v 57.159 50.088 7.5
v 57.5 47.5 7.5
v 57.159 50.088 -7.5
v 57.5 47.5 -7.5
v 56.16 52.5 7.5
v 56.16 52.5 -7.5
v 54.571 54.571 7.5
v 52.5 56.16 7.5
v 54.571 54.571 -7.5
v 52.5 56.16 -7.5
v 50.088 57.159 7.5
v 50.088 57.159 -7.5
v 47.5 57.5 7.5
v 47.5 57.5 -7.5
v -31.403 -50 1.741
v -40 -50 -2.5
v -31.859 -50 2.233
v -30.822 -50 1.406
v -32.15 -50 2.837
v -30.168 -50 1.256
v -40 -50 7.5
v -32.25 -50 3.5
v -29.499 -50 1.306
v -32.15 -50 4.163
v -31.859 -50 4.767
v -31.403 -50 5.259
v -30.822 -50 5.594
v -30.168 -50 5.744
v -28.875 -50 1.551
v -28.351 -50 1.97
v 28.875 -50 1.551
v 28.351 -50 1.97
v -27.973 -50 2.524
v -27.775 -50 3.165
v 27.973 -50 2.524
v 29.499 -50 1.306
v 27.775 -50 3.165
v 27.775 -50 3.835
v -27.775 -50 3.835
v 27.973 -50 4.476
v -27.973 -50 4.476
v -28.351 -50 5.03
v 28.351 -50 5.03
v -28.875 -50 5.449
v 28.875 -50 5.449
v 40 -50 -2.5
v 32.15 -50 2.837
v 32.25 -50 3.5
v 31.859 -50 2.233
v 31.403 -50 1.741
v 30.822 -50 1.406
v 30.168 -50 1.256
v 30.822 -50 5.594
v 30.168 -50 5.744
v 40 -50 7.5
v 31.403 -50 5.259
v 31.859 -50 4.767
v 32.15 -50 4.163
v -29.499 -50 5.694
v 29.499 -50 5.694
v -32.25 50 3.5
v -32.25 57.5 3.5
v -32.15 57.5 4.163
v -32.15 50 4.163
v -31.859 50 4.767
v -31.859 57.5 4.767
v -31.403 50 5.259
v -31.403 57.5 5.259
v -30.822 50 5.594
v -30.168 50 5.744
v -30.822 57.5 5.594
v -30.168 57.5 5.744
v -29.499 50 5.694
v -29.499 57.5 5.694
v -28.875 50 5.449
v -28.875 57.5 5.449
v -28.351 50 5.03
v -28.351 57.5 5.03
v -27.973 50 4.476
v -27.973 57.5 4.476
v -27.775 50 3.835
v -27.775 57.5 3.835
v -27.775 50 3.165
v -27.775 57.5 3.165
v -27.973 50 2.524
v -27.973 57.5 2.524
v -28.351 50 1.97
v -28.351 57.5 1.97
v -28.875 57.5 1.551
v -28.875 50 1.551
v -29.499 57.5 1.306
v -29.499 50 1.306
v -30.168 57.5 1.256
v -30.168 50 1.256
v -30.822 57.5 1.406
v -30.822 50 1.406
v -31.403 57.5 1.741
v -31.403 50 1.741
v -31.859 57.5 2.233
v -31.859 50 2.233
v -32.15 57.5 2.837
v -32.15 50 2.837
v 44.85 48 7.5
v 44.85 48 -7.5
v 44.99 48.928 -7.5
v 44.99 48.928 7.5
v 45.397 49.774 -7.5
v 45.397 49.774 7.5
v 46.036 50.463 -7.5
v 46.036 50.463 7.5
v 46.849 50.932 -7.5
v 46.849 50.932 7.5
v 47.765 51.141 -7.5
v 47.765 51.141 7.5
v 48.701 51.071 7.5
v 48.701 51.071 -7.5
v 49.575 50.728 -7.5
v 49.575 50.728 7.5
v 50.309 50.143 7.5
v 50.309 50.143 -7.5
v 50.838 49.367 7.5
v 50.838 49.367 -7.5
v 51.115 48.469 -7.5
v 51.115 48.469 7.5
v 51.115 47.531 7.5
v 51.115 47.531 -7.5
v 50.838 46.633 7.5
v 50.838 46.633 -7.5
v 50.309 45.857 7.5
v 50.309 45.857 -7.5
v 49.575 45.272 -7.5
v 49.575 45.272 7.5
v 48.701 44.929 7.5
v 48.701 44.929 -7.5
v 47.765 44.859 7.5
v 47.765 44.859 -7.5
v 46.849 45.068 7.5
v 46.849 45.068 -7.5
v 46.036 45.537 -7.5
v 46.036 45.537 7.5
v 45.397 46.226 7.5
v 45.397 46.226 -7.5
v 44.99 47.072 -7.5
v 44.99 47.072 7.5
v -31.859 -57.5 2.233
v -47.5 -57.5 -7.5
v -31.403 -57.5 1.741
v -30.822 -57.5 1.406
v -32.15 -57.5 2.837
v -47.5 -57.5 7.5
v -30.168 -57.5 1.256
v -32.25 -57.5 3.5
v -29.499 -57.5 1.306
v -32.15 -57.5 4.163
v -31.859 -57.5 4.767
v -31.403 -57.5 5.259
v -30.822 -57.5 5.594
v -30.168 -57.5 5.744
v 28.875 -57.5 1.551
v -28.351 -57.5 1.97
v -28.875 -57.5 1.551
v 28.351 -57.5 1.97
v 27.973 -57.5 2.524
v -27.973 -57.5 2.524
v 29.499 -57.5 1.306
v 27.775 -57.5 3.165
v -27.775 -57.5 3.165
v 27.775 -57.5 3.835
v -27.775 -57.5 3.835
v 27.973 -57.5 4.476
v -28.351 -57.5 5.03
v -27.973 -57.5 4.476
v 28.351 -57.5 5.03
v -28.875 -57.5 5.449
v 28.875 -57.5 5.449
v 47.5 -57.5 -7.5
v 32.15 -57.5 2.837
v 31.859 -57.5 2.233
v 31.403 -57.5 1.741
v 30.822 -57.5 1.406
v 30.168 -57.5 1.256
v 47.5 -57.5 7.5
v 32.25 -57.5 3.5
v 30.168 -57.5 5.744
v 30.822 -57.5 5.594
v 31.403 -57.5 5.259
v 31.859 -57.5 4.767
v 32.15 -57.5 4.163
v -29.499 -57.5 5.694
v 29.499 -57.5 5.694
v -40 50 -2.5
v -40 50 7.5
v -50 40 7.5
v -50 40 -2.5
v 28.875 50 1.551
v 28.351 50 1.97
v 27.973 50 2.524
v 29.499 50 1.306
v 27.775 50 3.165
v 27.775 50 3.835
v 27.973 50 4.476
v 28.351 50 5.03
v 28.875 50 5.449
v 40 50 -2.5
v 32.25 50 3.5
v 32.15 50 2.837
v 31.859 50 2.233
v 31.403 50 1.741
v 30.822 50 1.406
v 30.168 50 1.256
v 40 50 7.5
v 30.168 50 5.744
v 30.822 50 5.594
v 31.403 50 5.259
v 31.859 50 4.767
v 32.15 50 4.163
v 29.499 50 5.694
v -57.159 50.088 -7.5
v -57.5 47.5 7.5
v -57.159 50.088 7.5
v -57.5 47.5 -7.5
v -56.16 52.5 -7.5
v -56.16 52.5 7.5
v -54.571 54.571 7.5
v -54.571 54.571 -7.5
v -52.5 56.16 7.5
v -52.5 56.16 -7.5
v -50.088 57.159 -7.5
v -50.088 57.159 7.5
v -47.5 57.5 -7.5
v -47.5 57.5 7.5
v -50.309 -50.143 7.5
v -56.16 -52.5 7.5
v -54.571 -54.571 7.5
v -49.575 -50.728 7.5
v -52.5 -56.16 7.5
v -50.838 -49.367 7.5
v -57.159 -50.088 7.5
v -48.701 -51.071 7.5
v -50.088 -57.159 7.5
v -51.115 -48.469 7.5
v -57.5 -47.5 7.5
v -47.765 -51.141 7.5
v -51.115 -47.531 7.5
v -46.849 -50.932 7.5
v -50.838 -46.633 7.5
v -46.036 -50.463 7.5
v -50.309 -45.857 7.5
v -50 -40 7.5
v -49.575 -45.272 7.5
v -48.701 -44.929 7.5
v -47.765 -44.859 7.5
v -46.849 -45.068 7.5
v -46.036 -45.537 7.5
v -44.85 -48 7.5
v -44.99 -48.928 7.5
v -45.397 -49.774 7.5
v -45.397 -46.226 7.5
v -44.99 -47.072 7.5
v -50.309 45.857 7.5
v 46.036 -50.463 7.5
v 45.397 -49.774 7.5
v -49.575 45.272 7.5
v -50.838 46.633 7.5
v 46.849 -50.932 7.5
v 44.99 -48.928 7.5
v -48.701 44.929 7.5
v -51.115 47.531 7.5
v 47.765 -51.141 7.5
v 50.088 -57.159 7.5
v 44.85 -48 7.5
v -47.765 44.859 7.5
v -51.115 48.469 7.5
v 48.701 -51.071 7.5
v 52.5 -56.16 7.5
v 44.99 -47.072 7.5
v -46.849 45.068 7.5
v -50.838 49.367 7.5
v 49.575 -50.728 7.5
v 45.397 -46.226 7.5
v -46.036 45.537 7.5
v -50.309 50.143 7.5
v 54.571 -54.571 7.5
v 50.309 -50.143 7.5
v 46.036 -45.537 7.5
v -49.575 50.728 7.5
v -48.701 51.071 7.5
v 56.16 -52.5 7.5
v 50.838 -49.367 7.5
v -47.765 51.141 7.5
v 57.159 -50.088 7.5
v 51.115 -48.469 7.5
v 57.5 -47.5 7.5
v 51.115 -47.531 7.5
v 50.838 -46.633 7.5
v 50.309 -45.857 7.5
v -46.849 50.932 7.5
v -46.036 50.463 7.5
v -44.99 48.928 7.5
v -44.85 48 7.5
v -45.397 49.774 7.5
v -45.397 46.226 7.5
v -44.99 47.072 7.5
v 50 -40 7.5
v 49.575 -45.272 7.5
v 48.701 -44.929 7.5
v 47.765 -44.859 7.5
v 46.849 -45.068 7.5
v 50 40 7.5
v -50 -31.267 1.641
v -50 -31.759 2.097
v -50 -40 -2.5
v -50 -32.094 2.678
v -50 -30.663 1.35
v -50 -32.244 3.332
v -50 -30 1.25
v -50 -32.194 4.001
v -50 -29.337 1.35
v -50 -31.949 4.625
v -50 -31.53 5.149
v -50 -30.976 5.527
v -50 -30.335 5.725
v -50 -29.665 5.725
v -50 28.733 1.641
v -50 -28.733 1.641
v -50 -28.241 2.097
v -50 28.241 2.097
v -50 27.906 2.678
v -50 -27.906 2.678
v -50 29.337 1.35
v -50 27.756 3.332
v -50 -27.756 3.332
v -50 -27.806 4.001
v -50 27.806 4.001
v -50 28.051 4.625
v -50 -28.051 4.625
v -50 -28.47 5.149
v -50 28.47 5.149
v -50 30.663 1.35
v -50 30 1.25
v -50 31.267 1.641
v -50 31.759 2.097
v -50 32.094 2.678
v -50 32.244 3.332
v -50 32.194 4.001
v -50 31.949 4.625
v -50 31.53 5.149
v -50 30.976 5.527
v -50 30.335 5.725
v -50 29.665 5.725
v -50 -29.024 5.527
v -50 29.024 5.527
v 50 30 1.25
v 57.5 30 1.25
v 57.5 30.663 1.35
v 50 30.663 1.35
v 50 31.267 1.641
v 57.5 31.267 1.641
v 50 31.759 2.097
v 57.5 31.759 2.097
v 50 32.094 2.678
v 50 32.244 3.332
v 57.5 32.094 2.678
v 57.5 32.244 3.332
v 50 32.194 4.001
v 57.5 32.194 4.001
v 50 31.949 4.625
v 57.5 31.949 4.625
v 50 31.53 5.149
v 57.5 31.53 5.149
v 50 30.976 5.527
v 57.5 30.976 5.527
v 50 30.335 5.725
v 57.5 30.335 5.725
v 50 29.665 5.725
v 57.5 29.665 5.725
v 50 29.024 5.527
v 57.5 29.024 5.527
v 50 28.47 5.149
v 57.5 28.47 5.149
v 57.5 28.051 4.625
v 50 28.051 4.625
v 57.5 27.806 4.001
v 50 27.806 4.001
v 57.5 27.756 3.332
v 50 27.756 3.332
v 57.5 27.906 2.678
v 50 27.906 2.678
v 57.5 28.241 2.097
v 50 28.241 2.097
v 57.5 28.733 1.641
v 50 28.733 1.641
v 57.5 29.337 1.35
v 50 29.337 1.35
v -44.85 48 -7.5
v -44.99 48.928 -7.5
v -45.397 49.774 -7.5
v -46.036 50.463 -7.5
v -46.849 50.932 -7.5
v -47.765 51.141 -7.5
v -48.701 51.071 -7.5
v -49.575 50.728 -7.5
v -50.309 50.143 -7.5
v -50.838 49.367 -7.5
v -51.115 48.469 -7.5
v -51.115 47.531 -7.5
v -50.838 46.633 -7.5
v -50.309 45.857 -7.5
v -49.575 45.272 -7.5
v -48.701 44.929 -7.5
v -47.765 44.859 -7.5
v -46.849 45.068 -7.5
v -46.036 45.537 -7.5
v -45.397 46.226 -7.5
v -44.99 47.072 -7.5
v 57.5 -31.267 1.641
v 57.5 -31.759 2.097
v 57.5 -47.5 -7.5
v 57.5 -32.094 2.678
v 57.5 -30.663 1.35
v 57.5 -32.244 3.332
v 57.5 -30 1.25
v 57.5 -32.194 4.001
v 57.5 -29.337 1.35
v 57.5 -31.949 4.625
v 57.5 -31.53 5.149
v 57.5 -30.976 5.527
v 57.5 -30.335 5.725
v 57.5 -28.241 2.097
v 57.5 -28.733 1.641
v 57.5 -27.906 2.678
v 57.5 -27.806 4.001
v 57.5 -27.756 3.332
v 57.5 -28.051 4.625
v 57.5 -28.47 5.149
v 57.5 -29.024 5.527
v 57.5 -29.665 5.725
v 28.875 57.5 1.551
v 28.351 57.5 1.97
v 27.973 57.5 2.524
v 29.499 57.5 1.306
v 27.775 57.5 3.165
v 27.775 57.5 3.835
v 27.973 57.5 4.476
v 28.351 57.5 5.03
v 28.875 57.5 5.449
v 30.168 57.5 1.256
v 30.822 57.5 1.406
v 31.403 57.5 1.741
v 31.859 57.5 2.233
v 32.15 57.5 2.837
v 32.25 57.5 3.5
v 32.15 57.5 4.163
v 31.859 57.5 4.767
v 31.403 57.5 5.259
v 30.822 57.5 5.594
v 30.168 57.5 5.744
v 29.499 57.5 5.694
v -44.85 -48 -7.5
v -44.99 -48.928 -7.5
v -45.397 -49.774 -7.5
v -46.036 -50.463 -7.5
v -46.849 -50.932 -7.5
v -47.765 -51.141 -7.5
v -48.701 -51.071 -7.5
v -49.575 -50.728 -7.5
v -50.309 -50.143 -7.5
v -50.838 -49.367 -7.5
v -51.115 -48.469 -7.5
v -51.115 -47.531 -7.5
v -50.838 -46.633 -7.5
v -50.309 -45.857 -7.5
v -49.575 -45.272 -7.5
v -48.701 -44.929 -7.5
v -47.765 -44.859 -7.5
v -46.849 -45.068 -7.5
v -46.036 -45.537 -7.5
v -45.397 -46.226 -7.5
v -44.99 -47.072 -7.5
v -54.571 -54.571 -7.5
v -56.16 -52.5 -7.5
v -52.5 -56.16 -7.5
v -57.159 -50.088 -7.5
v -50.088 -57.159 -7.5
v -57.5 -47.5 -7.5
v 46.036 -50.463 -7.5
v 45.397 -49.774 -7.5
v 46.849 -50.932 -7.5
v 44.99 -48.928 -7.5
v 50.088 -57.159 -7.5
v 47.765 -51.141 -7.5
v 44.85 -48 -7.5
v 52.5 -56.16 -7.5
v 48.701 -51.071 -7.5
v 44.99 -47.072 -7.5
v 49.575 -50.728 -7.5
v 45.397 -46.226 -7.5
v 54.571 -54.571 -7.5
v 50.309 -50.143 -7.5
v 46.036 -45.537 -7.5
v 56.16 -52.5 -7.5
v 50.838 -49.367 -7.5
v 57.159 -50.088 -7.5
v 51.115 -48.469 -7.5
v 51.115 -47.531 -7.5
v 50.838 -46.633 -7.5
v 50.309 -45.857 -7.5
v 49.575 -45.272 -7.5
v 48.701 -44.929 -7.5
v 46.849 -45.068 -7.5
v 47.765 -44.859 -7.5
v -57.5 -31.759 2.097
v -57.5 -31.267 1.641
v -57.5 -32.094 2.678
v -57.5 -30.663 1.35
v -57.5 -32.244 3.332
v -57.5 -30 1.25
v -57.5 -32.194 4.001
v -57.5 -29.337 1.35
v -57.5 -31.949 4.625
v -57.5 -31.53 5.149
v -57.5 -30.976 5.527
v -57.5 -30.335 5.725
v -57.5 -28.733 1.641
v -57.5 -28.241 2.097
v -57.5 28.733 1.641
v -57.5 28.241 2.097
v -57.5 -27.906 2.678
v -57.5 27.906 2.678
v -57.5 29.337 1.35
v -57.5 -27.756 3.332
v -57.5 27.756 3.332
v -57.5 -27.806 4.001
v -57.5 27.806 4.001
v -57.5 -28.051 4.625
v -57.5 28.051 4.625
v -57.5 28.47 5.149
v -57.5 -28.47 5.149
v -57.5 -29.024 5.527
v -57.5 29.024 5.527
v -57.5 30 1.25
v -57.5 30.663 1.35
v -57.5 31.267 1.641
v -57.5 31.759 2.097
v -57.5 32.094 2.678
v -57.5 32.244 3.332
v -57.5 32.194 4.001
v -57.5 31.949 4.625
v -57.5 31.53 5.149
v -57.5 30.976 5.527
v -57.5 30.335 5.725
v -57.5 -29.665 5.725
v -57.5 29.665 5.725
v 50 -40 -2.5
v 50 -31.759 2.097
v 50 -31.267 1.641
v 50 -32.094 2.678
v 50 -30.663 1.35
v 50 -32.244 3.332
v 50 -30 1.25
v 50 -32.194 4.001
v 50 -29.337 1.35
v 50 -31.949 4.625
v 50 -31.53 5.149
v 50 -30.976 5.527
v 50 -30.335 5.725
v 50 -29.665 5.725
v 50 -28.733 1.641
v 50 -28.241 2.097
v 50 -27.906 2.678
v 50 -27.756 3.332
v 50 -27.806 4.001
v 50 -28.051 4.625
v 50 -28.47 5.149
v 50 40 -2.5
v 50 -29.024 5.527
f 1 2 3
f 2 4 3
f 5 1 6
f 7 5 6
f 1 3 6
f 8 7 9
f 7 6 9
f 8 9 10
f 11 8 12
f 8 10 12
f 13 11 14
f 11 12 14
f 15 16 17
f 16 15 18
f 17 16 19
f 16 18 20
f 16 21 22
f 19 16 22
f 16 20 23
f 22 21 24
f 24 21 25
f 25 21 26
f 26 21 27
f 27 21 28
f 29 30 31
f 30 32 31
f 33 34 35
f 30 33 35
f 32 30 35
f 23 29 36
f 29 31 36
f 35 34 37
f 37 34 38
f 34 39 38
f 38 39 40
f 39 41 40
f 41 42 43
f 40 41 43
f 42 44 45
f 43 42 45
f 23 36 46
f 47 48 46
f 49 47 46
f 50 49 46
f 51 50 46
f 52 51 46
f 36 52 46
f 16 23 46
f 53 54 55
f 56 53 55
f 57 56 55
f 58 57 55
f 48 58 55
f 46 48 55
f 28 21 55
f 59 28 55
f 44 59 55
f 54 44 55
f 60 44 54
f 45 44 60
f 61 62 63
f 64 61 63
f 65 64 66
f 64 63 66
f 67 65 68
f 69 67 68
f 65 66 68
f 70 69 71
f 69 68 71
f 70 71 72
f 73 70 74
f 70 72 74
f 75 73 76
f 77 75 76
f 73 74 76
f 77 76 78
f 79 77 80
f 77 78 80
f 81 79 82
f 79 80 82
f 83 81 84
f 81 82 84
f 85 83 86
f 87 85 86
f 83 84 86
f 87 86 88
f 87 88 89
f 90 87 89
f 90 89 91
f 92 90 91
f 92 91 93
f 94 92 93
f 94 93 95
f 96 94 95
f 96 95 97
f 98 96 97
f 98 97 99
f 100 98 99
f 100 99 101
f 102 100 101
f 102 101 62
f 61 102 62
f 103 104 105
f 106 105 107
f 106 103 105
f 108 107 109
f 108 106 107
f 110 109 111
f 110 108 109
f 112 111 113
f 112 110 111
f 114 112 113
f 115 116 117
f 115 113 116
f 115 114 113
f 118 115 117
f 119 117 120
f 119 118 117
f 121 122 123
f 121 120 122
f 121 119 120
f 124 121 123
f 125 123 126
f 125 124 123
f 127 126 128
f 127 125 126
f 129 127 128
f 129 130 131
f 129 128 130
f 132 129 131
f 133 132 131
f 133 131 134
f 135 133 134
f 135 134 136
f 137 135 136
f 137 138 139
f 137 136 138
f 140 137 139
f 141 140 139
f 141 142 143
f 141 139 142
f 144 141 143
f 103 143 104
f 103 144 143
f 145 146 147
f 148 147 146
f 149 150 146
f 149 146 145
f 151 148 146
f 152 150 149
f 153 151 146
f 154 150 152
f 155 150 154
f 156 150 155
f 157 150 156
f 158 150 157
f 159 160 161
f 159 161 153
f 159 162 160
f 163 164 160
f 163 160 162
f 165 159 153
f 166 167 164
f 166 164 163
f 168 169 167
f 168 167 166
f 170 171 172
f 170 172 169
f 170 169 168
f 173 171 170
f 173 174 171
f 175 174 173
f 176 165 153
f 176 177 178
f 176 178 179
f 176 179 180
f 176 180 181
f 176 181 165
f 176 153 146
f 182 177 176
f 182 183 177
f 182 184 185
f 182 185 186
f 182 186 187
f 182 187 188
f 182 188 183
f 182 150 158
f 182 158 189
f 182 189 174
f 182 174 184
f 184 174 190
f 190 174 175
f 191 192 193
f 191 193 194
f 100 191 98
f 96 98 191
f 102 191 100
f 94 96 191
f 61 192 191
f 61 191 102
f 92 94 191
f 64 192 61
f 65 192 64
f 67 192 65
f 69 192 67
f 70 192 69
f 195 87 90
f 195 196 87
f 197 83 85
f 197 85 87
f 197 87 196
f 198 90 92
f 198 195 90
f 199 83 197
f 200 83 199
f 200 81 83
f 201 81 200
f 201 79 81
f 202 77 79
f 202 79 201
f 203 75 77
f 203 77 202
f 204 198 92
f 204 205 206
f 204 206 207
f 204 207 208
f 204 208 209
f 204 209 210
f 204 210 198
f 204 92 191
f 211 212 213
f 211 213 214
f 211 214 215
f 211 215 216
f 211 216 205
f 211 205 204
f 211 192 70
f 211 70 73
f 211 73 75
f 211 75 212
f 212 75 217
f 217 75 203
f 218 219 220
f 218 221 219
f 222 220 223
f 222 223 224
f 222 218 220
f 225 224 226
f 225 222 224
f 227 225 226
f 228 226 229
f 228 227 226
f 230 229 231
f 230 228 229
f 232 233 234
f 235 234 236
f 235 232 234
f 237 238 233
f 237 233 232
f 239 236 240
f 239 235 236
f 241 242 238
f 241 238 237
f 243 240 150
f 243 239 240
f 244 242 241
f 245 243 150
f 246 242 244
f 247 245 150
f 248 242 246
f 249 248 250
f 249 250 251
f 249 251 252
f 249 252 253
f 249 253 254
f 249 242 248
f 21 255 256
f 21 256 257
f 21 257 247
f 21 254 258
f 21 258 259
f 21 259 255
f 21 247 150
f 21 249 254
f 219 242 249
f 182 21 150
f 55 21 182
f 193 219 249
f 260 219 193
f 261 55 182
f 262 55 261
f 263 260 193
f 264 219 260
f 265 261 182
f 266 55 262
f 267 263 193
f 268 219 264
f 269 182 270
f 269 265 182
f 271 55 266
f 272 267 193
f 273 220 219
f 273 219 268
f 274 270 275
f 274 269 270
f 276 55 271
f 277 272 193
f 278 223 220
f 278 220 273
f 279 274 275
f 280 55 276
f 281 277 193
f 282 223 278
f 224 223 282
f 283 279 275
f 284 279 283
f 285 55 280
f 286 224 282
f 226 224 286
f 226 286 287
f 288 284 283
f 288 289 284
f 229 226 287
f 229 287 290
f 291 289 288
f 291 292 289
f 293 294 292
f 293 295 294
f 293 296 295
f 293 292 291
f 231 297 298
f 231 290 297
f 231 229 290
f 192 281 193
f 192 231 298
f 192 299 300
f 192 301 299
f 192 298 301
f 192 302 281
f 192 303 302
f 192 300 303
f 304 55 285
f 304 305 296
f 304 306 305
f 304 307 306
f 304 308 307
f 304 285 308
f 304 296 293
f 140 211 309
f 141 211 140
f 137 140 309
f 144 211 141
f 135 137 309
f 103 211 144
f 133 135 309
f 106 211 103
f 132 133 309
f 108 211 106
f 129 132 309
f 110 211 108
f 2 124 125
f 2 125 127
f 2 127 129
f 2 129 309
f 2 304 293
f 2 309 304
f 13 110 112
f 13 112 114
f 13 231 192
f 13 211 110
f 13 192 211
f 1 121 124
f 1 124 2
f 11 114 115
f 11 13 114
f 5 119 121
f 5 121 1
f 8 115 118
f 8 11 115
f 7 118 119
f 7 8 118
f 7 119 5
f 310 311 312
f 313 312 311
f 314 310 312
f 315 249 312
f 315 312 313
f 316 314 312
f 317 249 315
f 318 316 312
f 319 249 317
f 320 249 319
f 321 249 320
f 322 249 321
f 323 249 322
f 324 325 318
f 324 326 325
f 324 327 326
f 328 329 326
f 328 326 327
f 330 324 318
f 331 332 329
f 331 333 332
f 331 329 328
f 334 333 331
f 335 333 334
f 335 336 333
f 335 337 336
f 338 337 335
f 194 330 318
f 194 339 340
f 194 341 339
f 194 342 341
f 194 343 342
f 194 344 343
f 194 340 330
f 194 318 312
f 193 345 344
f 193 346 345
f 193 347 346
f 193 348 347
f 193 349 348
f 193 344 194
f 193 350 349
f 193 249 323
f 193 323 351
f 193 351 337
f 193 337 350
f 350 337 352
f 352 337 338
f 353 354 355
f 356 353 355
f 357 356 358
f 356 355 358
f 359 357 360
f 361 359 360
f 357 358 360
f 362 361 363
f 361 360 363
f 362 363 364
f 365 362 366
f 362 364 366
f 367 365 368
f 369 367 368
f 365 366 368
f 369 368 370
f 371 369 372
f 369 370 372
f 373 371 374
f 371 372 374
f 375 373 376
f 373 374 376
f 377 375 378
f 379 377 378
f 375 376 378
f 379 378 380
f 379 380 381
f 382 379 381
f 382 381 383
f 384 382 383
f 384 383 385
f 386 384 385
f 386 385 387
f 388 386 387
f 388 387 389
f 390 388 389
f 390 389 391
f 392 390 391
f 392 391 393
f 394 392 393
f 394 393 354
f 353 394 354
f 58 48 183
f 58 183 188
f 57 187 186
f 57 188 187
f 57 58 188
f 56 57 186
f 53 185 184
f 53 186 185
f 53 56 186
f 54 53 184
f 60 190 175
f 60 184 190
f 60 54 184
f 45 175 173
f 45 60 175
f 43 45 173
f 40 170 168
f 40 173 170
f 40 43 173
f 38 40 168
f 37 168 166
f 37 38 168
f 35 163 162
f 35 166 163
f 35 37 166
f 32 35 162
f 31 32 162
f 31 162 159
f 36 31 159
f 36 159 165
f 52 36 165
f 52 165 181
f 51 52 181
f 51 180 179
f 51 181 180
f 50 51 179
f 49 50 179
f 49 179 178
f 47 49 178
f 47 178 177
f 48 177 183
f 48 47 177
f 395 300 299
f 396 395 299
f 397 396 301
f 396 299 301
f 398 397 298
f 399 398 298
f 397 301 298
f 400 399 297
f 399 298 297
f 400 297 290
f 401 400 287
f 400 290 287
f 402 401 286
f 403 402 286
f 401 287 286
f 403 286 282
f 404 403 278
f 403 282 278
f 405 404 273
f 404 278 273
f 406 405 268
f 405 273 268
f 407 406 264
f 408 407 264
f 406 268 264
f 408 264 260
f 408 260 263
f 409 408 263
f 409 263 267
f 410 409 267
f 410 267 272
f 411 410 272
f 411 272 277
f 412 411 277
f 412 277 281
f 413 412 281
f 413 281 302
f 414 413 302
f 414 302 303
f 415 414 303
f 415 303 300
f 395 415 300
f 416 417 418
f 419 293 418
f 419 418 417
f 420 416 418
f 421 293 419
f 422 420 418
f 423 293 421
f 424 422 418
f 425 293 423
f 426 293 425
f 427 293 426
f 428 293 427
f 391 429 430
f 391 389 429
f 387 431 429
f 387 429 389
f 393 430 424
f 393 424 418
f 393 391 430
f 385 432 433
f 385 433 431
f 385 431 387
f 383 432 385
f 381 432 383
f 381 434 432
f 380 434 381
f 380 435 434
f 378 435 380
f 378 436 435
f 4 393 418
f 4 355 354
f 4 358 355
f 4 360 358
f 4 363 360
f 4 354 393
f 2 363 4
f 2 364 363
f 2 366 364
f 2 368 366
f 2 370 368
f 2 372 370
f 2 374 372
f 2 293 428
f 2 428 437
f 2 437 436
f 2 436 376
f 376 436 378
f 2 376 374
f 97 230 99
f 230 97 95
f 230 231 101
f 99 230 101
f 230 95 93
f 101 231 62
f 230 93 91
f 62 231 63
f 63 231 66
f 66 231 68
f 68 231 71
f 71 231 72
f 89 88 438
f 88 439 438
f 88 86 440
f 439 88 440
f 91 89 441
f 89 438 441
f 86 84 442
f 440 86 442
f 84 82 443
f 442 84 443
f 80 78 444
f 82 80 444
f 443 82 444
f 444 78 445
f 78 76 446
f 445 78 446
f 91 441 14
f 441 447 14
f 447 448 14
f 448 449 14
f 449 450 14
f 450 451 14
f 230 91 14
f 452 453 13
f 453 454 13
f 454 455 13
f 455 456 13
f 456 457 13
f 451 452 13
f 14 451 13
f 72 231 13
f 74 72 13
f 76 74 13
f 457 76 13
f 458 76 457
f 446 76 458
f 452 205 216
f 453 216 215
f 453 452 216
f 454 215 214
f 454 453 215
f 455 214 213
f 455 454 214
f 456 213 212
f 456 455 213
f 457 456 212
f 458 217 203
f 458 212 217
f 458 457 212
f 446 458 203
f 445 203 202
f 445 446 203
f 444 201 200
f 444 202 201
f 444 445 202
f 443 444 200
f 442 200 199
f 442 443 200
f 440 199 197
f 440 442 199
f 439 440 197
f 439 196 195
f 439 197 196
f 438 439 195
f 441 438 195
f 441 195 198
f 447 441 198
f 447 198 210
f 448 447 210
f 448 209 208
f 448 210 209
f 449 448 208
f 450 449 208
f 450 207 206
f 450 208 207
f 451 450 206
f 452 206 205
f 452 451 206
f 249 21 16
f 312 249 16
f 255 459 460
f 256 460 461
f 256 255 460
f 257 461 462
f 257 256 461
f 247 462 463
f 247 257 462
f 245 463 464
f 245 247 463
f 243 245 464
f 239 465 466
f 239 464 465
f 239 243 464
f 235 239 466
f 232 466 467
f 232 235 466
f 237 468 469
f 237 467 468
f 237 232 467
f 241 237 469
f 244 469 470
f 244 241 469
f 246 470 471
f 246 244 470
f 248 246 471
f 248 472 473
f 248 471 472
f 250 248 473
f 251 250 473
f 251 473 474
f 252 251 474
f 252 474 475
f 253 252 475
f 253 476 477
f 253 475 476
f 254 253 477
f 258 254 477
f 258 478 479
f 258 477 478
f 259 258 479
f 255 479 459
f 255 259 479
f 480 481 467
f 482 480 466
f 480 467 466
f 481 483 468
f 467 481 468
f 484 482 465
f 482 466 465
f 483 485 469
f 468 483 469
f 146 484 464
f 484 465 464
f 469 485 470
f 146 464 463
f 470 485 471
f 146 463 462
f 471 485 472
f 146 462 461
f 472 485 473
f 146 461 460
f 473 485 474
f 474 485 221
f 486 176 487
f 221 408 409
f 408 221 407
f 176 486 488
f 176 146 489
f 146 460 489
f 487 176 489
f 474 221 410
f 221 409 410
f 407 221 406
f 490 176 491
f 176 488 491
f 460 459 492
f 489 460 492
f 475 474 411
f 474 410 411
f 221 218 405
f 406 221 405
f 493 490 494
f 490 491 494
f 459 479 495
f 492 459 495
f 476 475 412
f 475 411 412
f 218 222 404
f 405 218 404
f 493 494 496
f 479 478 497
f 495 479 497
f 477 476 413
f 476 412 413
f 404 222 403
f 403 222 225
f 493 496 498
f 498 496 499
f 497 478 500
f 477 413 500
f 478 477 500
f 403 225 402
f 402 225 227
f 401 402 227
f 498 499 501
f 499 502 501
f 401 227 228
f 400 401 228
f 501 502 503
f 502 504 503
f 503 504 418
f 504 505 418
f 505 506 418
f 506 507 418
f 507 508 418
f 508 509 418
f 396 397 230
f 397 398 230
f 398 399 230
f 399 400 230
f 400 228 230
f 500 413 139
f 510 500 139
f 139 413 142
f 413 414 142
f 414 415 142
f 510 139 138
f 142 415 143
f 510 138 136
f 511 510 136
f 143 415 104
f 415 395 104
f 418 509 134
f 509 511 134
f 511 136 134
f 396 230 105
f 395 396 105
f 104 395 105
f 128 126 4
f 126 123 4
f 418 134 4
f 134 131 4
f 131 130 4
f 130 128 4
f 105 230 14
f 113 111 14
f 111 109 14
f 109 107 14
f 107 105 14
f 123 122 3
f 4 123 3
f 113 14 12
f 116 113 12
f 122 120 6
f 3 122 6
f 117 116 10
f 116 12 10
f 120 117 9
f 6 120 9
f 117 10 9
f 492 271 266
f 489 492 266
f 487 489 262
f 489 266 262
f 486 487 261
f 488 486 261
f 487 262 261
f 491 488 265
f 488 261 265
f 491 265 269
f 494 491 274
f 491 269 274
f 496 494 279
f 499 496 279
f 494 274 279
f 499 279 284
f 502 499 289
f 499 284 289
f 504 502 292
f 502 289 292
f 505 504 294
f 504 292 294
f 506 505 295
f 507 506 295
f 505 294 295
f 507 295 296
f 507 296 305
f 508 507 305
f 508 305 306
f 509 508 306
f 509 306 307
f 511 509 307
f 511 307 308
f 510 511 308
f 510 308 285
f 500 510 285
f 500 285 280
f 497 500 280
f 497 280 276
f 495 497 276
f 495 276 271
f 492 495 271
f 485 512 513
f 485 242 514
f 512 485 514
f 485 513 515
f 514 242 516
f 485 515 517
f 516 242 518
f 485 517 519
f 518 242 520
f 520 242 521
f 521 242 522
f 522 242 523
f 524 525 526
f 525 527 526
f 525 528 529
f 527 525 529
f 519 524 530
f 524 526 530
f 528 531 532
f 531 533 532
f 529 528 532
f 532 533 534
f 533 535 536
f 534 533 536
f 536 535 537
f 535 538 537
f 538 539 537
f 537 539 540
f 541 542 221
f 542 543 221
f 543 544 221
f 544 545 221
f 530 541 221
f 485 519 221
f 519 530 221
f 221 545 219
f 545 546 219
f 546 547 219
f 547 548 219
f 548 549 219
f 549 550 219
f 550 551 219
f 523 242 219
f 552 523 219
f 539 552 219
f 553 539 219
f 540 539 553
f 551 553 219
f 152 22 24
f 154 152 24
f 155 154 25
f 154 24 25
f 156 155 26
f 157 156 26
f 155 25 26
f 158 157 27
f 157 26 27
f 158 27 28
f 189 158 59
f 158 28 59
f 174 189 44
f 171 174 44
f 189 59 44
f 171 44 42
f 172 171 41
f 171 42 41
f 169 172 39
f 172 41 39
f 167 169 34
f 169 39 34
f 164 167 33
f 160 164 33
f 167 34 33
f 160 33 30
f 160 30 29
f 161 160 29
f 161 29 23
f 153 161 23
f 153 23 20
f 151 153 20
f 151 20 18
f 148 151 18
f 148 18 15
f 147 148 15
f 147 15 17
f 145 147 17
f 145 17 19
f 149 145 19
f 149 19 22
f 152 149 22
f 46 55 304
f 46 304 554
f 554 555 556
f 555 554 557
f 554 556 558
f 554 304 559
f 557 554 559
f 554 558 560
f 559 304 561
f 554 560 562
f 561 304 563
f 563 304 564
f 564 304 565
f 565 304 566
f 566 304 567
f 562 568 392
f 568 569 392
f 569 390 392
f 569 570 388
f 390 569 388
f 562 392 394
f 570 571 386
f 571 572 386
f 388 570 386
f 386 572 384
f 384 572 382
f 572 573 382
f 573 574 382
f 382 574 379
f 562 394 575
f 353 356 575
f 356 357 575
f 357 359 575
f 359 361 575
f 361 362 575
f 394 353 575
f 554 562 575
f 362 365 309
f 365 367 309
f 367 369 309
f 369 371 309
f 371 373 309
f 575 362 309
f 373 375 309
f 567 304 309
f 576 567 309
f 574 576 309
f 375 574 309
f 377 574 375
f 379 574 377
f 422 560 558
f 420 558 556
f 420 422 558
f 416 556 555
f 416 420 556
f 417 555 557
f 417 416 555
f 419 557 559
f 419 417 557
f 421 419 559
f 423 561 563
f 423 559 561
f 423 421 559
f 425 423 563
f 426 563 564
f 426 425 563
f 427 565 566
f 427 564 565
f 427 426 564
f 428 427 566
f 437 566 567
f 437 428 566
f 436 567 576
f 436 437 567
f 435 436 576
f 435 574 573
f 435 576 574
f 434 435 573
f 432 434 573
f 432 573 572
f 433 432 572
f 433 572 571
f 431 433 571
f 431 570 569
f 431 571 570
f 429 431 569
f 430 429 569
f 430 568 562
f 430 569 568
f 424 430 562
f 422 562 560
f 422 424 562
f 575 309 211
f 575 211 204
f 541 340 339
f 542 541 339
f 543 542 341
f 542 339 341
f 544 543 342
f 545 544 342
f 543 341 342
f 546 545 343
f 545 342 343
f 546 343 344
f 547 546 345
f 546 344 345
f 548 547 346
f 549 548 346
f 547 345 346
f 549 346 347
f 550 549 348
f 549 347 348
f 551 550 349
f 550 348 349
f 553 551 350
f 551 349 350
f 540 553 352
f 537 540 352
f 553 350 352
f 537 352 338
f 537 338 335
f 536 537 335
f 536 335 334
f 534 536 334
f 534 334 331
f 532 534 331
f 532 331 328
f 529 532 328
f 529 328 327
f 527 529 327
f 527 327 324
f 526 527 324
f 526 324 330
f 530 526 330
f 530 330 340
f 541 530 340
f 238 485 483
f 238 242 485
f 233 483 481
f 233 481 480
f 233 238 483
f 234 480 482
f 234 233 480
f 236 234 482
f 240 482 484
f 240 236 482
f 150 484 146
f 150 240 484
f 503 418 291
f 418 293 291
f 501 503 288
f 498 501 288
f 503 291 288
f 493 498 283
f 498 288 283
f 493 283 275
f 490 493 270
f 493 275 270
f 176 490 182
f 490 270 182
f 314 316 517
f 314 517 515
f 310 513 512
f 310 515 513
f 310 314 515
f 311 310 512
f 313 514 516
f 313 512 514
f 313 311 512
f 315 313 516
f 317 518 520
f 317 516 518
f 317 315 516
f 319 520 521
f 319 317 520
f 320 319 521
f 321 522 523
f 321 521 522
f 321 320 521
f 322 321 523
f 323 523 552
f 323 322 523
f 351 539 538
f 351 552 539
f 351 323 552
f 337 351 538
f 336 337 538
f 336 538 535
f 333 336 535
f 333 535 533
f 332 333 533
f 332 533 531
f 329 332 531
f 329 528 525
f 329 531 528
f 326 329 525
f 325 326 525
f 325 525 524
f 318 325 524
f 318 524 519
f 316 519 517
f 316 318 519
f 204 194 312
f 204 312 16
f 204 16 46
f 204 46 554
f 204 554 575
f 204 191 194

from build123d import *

# Parameters (mm, degrees)
SKETCH1_W                                  = 115
SKETCH1_H                                  = 115
BOSS_EXTRUDE1_DEPTH                        = 7.5
FILLET1_R                                  = 10
SKETCH2_W                                  = 100
SKETCH2_H                                  = 100
CUT_EXTRUDE1_DEPTH                         = 10
CHAMFER1_SIZE                              = 10
SKETCH3_R                                  = 3.15
CUT_EXTRUDE2_DEPTH                         = 30
MIRROR1_AT_THE_SECOND_PLANE_COPY_1_SKETC_R = 3.15
MIRROR1_AT_THE_SECOND_PLANE_COPY_1_DEPTH   = 30
SKETCH4_R                                  = 2.25
CUT_EXTRUDE3_DEPTH                         = 130
SKETCH6_R                                  = 2.25
CUT_EXTRUDE4_DEPTH                         = 129.792468724


with BuildPart() as part:
    # Sketch1 → Boss-Extrude1 (new, symmetric)
    with BuildSketch(Plane.XY):
        Rectangle(SKETCH1_W, SKETCH1_H)
    extrude(amount=BOSS_EXTRUDE1_DEPTH, both=True)

    # Fillet1
    fillet1_edges = [part.edges().sort_by_distance(p)[0] for p in [
        (-57.5, 57.5, 0),
        (57.5, 57.5, 0),
        (57.5, -57.5, 0),
        (-57.5, -57.5, 0),
    ]]
    fillet(fillet1_edges, radius=FILLET1_R)

    # Sketch2 → Cut-Extrude1 (cut)
    with BuildSketch(Plane.XY.offset(7.5)):
        Rectangle(SKETCH2_W, SKETCH2_H)
    extrude(amount=-CUT_EXTRUDE1_DEPTH, mode=Mode.SUBTRACT)

    # Chamfer1
    chamfer1_edges = [part.edges().sort_by_distance(p)[0] for p in [
        (-50, -50, 2.5),
        (-50, 50, 2.5),
        (50, 50, 2.5),
        (50, -50, 2.5),
    ]]
    chamfer(chamfer1_edges, length=CHAMFER1_SIZE)

    # Sketch3 → Cut-Extrude2 (cut)
    with BuildSketch(Plane.XY.offset(7.5)):
        with Locations((-48, 48)):
            Circle(SKETCH3_R)
    cut_extrude2 = extrude(amount=-CUT_EXTRUDE2_DEPTH, mode=Mode.SUBTRACT)

    # Mirror1: Cut-Extrude2 across plane
    add(cut_extrude2.mirror(Plane(origin=(0, 0, 0), x_dir=(0, 0, 1), z_dir=(1, 0, 0))), mode=Mode.SUBTRACT)

    # Mirror1 at the second plane: Cut-Extrude2 across plane
    add(cut_extrude2.mirror(Plane.ZX), mode=Mode.SUBTRACT)

    # Mirror1 at the second plane copy 1 sketc → Mirror1 at the second plane copy 1 (cut)
    with BuildSketch(Plane(origin=(0, 0, 7.5), x_dir=(-1, 0, 0), z_dir=(0, 0, 1))):
        with Locations((-48, 48)):
            Circle(MIRROR1_AT_THE_SECOND_PLANE_COPY_1_SKETC_R)
    extrude(amount=-MIRROR1_AT_THE_SECOND_PLANE_COPY_1_DEPTH, mode=Mode.SUBTRACT)

    # Sketch4 → Cut-Extrude3 (cut)
    with BuildSketch(Plane(origin=(57.5, 0, 0), x_dir=(0, 0, -1), z_dir=(1, 0, 0))):
        with Locations((-3.5, 30)):
            Circle(SKETCH4_R)
    cut_extrude3 = extrude(amount=-CUT_EXTRUDE3_DEPTH, mode=Mode.SUBTRACT)

    # Mirror2: Cut-Extrude3 across plane
    add(cut_extrude3.mirror(Plane.ZX), mode=Mode.SUBTRACT)

    # Sketch6 → Cut-Extrude4 (cut, through all)
    with BuildSketch(Plane(origin=(0, 57.5, 0), x_dir=(1, 0, 0), z_dir=(0, 1, 0))):
        with Locations(Location((-30, -3.5, 0), (0, 0, 180))):
            Circle(SKETCH6_R)
    cut_extrude4 = extrude(amount=-CUT_EXTRUDE4_DEPTH, mode=Mode.SUBTRACT)

    # Mirror3: Cut-Extrude4 across plane
    add(cut_extrude4.mirror(Plane(origin=(0, 0, 0), x_dir=(0, 0, 1), z_dir=(1, 0, 0))), mode=Mode.SUBTRACT)


solid = part.part
